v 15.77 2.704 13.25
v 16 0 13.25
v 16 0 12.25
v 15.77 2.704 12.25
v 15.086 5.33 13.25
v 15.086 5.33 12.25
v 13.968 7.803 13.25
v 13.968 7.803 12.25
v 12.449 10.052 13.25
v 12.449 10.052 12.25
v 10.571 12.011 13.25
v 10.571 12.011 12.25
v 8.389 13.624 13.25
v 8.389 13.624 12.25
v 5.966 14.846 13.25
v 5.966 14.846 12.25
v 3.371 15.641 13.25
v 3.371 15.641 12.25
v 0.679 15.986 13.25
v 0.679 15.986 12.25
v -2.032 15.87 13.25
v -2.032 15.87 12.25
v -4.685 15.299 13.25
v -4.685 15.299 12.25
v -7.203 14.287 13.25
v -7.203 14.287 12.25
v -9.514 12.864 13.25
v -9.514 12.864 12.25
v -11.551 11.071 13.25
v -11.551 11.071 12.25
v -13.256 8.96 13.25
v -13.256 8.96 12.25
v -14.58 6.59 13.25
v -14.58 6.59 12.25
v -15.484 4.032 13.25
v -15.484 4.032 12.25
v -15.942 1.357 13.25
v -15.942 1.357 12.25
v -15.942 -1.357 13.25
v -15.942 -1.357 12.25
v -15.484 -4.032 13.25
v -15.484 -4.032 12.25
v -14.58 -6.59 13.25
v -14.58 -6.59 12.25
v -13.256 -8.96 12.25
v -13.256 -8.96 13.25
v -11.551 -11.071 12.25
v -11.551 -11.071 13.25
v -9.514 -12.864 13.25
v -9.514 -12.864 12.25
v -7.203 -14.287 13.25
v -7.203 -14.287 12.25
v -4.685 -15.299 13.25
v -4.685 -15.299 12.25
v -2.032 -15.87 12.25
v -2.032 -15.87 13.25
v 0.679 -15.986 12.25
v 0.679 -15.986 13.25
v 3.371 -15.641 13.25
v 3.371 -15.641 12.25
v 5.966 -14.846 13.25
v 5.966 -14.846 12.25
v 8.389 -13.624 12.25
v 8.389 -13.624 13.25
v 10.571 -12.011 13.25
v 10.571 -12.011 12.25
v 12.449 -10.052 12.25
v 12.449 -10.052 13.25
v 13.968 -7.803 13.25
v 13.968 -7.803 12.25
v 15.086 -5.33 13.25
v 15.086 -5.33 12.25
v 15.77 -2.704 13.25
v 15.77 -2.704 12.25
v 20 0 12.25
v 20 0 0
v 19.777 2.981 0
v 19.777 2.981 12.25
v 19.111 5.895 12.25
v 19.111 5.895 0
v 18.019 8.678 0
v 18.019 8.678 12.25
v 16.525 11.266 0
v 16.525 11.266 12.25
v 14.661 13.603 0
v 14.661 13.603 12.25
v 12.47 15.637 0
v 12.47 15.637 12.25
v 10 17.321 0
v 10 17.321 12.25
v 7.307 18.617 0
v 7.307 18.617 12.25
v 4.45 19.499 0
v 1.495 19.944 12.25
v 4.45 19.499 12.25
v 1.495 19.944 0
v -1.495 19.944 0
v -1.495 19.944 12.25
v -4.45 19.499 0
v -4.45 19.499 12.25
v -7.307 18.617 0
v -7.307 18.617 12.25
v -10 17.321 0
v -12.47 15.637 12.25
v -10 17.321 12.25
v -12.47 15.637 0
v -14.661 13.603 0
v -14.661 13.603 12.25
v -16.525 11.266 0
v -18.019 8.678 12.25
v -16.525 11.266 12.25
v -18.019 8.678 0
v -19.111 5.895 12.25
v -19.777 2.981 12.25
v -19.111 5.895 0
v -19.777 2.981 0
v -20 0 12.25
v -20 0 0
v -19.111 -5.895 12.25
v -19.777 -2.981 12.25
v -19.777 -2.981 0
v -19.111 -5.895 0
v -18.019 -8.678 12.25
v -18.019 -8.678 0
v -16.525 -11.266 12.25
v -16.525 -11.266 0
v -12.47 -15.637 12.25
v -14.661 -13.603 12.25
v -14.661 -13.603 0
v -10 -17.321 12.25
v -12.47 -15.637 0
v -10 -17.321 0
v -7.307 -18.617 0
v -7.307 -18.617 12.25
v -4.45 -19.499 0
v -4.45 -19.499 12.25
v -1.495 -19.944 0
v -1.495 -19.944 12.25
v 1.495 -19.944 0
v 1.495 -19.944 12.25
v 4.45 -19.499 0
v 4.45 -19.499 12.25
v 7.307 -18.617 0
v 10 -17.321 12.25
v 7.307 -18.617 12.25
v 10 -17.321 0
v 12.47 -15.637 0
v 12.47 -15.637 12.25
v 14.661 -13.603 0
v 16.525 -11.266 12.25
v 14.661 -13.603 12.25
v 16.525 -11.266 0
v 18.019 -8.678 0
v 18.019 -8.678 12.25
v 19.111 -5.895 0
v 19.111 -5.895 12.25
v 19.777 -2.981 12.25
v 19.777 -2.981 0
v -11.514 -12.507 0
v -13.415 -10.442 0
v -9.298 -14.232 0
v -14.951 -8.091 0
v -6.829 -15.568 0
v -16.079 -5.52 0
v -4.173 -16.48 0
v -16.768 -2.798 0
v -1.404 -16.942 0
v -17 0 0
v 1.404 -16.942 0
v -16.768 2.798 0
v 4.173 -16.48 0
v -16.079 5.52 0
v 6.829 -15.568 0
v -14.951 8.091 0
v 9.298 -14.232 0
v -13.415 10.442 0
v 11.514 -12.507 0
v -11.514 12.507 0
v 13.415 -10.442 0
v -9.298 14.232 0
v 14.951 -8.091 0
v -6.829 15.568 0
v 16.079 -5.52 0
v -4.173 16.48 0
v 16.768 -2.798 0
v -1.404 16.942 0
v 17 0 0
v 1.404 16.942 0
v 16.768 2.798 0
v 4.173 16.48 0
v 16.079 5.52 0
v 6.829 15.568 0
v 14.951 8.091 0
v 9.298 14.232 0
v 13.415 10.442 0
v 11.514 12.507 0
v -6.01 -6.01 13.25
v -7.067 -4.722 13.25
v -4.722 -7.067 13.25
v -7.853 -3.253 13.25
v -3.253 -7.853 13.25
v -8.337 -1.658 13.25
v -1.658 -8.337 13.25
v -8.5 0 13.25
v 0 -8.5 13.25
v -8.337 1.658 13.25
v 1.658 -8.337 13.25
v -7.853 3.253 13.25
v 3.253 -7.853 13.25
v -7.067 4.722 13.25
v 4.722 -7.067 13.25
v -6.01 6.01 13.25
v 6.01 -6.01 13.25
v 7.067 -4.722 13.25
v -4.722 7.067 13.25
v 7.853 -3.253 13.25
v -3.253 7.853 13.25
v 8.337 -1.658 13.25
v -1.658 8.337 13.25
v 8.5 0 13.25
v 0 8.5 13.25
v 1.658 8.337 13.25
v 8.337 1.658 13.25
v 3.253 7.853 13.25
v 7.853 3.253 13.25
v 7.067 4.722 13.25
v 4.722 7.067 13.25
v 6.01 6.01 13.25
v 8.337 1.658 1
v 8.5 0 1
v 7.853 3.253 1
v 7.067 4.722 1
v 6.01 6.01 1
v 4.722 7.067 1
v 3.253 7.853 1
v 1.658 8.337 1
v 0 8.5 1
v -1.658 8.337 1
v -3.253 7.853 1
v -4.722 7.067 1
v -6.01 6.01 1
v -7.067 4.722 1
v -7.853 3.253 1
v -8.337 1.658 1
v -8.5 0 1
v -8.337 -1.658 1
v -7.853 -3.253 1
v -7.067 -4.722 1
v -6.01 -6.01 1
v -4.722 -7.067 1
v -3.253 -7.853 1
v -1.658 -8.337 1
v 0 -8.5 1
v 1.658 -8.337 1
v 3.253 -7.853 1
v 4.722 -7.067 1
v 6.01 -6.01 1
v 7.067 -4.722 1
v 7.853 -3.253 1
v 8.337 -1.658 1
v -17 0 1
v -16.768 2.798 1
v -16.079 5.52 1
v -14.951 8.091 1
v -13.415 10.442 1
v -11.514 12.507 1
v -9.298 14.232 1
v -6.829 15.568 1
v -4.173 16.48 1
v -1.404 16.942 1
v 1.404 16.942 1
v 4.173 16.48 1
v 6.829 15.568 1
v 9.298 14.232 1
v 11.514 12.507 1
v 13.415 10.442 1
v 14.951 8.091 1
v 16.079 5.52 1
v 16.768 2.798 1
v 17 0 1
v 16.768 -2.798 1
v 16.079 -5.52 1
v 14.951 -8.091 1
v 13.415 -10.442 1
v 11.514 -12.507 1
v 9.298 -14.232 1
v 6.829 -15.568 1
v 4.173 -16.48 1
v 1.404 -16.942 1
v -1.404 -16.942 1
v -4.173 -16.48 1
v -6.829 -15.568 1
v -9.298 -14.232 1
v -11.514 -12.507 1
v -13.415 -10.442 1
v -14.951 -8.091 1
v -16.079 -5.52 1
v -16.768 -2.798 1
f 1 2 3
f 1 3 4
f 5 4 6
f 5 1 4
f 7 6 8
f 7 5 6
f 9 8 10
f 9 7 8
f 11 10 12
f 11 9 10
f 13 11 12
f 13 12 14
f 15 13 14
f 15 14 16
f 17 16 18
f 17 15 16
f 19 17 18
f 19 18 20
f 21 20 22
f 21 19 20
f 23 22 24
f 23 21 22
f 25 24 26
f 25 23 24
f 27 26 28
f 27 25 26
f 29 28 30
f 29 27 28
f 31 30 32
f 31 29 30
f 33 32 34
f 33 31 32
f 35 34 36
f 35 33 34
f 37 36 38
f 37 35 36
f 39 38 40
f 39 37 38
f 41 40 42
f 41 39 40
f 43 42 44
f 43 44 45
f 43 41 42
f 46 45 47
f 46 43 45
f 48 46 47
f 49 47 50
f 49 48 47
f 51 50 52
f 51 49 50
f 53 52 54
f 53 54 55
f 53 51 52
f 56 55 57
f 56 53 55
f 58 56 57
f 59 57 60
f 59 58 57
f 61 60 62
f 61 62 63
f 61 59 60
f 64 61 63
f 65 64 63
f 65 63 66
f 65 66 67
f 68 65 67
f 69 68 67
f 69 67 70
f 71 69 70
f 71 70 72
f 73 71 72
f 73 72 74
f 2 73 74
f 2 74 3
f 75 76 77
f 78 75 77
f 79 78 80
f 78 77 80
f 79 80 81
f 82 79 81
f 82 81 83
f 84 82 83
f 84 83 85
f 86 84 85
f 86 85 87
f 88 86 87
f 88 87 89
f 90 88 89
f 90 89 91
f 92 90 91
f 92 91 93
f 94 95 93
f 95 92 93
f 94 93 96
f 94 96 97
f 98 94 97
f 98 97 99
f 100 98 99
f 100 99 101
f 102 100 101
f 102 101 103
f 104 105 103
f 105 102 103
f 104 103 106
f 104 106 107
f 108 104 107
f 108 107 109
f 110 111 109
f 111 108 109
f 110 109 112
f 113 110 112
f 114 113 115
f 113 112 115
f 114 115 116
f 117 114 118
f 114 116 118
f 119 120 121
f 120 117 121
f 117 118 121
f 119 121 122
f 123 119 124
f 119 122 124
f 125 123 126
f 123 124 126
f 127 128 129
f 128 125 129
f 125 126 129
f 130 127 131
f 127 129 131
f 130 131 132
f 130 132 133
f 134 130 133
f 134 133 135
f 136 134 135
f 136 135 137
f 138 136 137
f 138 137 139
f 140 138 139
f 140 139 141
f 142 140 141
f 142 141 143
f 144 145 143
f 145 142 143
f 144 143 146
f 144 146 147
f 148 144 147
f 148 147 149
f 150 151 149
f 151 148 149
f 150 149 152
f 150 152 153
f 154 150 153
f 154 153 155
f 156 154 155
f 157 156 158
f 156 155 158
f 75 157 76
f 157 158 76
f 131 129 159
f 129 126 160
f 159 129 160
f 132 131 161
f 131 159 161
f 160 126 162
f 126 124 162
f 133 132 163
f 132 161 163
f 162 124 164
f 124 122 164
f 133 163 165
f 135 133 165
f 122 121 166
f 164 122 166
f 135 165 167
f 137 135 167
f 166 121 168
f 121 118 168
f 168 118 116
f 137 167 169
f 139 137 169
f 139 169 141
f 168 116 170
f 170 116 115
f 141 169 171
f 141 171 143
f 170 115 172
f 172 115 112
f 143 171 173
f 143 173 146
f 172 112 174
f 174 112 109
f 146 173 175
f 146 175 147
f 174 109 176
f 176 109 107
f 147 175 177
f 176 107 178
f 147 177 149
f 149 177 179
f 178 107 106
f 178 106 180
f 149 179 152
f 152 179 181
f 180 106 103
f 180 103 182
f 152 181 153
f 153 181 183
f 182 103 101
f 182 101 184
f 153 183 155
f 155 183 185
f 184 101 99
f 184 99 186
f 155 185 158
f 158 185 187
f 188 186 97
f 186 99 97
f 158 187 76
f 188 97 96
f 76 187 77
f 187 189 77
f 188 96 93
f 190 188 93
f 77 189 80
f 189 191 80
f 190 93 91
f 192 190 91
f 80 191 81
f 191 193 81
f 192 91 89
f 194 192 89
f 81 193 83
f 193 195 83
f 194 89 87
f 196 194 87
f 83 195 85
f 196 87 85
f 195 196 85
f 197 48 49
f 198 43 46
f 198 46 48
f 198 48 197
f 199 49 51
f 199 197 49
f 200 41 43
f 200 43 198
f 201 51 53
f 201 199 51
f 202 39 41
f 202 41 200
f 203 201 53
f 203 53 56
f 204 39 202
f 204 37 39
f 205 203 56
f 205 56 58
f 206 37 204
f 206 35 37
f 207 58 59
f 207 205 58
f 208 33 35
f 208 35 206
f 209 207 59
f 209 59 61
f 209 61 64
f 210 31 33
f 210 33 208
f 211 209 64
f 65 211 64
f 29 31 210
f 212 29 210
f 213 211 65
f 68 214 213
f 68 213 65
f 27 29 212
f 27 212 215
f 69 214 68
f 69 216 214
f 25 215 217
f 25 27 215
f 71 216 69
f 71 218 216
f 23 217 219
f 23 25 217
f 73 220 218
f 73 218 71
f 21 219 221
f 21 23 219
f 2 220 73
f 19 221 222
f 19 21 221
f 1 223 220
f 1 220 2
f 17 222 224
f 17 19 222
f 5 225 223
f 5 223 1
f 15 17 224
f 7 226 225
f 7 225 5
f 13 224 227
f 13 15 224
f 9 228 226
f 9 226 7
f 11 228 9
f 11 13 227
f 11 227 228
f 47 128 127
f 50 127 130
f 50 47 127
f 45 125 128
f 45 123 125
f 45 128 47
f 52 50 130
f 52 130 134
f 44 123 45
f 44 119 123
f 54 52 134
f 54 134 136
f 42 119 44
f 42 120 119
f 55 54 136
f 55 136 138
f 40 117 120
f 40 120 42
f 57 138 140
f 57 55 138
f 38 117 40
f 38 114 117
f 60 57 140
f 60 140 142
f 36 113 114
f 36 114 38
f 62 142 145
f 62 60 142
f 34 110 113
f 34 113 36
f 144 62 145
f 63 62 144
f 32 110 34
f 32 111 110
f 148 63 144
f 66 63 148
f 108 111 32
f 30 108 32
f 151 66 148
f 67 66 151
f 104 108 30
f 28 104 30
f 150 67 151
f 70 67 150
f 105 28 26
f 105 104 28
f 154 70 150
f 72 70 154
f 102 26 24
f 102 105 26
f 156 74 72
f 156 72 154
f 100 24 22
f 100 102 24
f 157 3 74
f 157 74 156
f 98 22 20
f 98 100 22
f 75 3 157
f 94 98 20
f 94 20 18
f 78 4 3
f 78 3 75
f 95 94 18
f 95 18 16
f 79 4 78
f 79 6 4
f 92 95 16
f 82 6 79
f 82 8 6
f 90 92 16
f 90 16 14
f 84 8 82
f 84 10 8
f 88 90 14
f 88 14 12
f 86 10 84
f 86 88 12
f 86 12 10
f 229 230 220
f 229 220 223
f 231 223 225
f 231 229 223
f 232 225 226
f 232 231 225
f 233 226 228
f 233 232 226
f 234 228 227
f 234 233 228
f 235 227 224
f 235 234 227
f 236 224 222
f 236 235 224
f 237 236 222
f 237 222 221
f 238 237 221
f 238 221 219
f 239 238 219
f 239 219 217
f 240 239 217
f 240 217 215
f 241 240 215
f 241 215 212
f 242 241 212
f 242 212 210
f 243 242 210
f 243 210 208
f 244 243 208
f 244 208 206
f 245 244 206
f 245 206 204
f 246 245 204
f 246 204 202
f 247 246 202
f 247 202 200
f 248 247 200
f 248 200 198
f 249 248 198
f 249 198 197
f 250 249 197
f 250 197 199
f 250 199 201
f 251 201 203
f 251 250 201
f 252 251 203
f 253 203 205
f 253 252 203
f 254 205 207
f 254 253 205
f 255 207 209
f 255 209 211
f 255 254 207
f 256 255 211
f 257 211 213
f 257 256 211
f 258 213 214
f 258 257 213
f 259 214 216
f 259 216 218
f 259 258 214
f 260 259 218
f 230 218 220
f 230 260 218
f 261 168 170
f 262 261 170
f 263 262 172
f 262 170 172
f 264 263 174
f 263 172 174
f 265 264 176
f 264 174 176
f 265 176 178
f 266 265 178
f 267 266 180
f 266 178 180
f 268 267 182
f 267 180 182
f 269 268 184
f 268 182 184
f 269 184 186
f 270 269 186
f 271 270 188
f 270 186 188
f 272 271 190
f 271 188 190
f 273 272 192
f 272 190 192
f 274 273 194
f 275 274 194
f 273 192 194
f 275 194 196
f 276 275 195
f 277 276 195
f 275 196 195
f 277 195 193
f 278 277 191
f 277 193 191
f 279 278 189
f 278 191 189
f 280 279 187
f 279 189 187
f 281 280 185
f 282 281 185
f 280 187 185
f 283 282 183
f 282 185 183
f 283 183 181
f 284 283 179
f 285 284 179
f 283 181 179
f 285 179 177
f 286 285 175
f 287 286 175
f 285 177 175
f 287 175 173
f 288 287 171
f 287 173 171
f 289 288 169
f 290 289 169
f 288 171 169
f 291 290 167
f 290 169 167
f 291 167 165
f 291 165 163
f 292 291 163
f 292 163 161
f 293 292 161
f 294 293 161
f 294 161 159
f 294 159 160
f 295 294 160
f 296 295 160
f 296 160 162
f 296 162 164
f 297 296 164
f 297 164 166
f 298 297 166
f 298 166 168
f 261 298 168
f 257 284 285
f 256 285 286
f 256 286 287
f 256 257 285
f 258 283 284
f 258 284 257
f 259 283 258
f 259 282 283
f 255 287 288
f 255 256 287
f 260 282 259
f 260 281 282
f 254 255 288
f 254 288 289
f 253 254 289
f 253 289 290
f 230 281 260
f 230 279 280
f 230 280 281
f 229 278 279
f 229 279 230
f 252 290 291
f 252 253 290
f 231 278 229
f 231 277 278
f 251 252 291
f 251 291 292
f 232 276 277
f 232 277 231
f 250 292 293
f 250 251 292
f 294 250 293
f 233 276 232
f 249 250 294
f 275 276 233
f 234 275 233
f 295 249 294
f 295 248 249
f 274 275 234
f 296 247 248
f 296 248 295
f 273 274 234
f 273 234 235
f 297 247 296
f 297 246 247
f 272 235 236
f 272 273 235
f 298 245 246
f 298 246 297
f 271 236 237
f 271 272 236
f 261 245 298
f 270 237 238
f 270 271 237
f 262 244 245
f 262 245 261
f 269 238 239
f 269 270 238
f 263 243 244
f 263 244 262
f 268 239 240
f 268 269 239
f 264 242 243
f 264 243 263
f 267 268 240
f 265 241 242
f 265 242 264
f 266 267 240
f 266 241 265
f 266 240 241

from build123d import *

# Parameters (mm, degrees)
ESQUISSE1_R             = 20
ESQUISSE1_R_2           = 8.5
BOSS_EXTRU_1_DEPTH      = 13.25
ESQUISSE2_R             = 17
ENL_V_MAT_EXTRU_1_DEPTH = 1
ESQUISSE3_OUTSIDE_W     = 53.62
ESQUISSE3_OUTSIDE_H     = 53.62
ESQUISSE3_OUTSIDE_R     = 16
ENL_V_MAT_EXTRU_2_DEPTH = 1


with BuildPart() as part:
    # Esquisse1 → Boss.-Extru.1 (new body)
    with BuildSketch(Plane.XY):
        Circle(ESQUISSE1_R)
        Circle(ESQUISSE1_R_2, mode=Mode.SUBTRACT)
    extrude(amount=BOSS_EXTRU_1_DEPTH)

    # Esquisse2 → Enlèv. mat.-Extru.1 (cut)
    with BuildSketch(Plane(origin=(0, 0, 0), x_dir=(-1, 0, 0), z_dir=(0, 0, -1))):
        Circle(ESQUISSE2_R)
    extrude(amount=-ENL_V_MAT_EXTRU_1_DEPTH, mode=Mode.SUBTRACT)

    # Esquisse3 outside → Enlèv. mat.-Extru.2 (cut)
    with BuildSketch(Plane.XY.offset(13.25)):
        Rectangle(ESQUISSE3_OUTSIDE_W, ESQUISSE3_OUTSIDE_H)
        Circle(ESQUISSE3_OUTSIDE_R, mode=Mode.SUBTRACT)
    extrude(amount=-ENL_V_MAT_EXTRU_2_DEPTH, mode=Mode.SUBTRACT)


solid = part.part
